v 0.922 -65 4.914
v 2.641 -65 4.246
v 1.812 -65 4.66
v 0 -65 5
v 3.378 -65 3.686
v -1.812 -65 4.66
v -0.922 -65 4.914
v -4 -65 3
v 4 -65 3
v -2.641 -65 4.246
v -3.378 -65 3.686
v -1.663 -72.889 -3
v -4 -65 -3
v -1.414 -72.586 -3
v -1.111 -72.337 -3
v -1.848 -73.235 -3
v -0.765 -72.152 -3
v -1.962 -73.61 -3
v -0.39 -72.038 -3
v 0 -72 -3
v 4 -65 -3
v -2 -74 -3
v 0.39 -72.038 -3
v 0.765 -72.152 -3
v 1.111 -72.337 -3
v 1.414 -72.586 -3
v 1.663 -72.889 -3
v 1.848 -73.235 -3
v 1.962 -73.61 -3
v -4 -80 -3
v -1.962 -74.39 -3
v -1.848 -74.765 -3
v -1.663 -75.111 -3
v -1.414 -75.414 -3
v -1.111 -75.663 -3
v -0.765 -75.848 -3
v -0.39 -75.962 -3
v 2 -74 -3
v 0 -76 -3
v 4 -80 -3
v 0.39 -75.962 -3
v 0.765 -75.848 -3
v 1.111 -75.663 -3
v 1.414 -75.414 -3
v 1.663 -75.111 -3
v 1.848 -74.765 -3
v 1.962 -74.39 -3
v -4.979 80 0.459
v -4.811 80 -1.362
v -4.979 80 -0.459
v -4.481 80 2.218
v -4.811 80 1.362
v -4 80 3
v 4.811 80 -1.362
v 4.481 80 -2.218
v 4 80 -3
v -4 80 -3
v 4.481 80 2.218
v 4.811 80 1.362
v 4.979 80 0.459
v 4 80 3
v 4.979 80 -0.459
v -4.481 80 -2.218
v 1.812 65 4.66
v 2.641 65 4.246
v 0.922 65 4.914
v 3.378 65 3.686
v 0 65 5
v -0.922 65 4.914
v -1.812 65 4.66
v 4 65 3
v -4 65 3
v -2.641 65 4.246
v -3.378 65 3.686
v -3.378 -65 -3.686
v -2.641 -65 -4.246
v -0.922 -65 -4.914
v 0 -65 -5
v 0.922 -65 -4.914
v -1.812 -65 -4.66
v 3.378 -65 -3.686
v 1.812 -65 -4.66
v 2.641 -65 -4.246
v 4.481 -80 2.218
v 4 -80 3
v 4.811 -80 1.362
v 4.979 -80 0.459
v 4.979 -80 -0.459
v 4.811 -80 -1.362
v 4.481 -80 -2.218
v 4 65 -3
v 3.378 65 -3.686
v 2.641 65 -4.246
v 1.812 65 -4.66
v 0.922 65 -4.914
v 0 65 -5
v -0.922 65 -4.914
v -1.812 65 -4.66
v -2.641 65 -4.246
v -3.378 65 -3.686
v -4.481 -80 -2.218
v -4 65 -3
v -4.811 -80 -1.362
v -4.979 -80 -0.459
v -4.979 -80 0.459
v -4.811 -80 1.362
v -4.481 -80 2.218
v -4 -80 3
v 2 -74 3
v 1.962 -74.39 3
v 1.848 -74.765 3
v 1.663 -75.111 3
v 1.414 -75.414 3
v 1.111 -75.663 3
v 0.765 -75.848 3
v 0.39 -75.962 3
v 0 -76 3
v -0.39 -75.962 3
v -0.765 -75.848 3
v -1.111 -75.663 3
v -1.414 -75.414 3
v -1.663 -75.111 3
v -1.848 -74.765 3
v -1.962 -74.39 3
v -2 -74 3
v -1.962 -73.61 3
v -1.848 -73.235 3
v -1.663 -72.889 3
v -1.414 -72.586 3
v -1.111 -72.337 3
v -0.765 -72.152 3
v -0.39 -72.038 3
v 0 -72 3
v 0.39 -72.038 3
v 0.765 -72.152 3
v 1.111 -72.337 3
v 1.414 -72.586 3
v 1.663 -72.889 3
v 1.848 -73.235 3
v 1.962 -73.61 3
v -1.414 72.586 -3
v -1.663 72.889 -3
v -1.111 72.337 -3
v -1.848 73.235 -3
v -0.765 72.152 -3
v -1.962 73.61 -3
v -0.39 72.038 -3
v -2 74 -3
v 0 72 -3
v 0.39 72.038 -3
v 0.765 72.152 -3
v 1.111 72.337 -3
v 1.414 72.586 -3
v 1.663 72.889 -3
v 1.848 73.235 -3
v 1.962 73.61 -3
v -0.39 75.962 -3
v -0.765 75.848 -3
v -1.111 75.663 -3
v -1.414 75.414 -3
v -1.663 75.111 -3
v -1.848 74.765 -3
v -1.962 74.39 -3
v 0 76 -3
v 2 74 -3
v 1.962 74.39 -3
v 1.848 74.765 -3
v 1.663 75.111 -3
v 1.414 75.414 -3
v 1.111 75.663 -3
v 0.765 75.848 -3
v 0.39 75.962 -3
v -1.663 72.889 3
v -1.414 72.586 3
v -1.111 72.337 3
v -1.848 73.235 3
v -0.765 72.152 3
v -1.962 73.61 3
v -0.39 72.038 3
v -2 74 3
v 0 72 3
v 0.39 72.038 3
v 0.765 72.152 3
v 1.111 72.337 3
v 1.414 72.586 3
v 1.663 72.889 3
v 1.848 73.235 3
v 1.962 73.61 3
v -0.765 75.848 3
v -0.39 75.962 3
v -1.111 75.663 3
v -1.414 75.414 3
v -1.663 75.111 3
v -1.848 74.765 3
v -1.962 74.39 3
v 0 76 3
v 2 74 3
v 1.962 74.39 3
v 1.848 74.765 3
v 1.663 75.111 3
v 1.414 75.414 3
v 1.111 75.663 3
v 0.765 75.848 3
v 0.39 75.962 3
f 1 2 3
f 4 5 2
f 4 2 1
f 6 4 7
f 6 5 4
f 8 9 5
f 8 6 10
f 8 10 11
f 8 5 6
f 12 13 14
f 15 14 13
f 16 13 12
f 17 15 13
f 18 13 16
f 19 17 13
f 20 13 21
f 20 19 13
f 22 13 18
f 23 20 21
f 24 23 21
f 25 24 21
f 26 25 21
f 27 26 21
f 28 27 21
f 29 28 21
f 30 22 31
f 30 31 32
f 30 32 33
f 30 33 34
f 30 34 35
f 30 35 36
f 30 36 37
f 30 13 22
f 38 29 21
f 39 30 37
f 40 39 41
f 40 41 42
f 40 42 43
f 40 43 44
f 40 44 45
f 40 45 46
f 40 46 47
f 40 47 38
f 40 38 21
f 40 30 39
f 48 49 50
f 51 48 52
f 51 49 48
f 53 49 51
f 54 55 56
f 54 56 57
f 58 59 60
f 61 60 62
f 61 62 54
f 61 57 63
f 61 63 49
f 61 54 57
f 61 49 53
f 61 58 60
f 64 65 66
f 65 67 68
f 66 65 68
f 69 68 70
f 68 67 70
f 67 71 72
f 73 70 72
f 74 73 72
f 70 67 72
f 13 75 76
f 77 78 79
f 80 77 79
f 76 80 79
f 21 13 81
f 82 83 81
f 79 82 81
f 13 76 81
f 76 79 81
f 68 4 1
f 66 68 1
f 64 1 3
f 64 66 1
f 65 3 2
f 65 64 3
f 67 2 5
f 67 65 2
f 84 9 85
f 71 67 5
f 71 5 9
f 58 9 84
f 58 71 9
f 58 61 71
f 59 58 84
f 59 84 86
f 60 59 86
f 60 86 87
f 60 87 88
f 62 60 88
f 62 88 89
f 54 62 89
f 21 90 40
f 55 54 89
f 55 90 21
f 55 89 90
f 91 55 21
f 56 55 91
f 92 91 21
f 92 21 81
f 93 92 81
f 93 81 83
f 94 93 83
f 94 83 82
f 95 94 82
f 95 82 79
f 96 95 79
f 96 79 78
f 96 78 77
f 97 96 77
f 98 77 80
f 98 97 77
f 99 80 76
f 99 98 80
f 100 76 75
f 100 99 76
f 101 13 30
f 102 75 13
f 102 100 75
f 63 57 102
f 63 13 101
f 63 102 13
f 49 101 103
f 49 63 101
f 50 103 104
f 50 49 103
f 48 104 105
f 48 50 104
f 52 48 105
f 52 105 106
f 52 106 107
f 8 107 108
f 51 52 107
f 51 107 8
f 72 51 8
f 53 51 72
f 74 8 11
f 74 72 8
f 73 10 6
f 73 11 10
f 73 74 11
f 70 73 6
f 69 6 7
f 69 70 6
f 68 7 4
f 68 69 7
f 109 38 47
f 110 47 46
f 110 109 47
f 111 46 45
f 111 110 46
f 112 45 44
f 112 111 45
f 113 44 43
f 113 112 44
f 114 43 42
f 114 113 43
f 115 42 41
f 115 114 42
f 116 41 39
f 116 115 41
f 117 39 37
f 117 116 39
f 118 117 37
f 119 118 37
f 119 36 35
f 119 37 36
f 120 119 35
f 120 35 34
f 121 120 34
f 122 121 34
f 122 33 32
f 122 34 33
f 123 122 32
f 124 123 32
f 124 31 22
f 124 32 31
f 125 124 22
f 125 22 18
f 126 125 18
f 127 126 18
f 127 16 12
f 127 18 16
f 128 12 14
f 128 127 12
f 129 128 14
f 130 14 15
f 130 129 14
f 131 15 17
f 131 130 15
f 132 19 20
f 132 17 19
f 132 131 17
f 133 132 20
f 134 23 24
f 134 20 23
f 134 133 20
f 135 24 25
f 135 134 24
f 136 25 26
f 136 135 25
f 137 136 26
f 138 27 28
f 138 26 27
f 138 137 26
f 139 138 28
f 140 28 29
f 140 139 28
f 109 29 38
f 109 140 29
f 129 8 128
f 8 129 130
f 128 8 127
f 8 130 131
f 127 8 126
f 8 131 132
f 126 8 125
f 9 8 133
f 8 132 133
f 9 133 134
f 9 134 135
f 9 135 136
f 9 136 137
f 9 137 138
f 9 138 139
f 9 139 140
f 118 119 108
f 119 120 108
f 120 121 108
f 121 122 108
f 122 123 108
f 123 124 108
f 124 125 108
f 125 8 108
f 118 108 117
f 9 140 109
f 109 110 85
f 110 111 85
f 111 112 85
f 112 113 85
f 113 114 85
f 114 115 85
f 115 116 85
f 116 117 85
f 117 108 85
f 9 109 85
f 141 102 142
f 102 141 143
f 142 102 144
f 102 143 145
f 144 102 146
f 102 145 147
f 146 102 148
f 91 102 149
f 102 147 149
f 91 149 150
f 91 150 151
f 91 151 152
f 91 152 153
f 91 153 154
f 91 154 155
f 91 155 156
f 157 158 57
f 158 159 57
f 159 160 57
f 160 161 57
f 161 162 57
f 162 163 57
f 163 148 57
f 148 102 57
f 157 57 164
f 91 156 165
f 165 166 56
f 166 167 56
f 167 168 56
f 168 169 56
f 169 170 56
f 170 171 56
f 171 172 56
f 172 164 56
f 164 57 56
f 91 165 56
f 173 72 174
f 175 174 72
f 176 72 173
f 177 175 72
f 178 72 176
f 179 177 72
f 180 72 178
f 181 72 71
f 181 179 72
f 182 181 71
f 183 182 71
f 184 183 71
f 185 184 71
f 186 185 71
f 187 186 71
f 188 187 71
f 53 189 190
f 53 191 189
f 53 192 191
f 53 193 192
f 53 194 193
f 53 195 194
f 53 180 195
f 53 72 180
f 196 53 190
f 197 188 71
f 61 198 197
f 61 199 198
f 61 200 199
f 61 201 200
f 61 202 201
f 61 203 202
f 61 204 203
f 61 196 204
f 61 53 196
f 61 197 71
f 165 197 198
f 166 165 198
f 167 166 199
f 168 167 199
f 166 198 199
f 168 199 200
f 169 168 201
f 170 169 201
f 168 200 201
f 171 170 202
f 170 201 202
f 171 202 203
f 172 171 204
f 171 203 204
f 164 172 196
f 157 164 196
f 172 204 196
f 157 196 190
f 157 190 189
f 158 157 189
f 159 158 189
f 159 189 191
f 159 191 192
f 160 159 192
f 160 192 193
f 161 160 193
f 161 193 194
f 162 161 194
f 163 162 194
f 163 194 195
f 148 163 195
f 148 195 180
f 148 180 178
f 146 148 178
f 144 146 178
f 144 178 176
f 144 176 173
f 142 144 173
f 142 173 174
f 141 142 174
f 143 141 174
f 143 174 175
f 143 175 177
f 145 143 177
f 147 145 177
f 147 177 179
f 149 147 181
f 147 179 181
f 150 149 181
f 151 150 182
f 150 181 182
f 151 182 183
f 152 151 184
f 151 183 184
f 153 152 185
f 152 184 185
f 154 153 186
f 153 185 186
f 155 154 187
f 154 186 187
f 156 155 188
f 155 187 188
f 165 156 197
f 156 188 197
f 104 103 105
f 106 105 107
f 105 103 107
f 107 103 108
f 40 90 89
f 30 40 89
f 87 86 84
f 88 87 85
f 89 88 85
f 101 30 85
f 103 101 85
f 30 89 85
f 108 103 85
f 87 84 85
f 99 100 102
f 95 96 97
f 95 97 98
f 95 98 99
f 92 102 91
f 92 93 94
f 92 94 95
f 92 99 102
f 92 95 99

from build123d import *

# Parameters (mm, degrees)
SKETCH1_R           = 5
BOSS_EXTRUDE1_DEPTH = 80
CUT_EXTRUDE1_DEPTH  = 15
SKETCH3_R           = 2
CUT_EXTRUDE2_DEPTH  = 81.554329493


with BuildPart() as part:
    # Sketch1 → Boss-Extrude1 (new, symmetric)
    with BuildSketch(Plane(origin=(0, 0, 0), x_dir=(1, 0, 0), z_dir=(0, 1, 0))):
        with Locations(Location((0, 0, 0), (0, 0, 270))):
            Circle(SKETCH1_R)
    extrude(amount=BOSS_EXTRUDE1_DEPTH, both=True)

    # Sketch2 → Cut-Extrude1 (cut)
    with BuildSketch(Plane(origin=(0, 80, 0), x_dir=(1, 0, 0), z_dir=(0, 1, 0))):
        with BuildLine():
            Line((-4, -3), (4, -3))
            ThreePointArc((4, -3), (0, -5), (-4, -3))
        make_face()
        with BuildLine():
            Line((-4, 3), (4, 3))
            ThreePointArc((4, 3), (0, 5), (-4, 3))
        make_face()
    cut_extrude1 = extrude(amount=-CUT_EXTRUDE1_DEPTH, mode=Mode.SUBTRACT)

    # Mirror2: Cut-Extrude1 across plane
    add(cut_extrude1.mirror(Plane.ZX), mode=Mode.SUBTRACT)

    # Sketch3 → Cut-Extrude2 (cut, through all)
    with BuildSketch(Plane.XY.offset(3)):
        with Locations((0, 74)):
            Circle(SKETCH3_R)
    cut_extrude2 = extrude(amount=-CUT_EXTRUDE2_DEPTH, mode=Mode.SUBTRACT)

    # Mirror3: Cut-Extrude2 across plane
    add(cut_extrude2.mirror(Plane.ZX), mode=Mode.SUBTRACT)


solid = part.part
